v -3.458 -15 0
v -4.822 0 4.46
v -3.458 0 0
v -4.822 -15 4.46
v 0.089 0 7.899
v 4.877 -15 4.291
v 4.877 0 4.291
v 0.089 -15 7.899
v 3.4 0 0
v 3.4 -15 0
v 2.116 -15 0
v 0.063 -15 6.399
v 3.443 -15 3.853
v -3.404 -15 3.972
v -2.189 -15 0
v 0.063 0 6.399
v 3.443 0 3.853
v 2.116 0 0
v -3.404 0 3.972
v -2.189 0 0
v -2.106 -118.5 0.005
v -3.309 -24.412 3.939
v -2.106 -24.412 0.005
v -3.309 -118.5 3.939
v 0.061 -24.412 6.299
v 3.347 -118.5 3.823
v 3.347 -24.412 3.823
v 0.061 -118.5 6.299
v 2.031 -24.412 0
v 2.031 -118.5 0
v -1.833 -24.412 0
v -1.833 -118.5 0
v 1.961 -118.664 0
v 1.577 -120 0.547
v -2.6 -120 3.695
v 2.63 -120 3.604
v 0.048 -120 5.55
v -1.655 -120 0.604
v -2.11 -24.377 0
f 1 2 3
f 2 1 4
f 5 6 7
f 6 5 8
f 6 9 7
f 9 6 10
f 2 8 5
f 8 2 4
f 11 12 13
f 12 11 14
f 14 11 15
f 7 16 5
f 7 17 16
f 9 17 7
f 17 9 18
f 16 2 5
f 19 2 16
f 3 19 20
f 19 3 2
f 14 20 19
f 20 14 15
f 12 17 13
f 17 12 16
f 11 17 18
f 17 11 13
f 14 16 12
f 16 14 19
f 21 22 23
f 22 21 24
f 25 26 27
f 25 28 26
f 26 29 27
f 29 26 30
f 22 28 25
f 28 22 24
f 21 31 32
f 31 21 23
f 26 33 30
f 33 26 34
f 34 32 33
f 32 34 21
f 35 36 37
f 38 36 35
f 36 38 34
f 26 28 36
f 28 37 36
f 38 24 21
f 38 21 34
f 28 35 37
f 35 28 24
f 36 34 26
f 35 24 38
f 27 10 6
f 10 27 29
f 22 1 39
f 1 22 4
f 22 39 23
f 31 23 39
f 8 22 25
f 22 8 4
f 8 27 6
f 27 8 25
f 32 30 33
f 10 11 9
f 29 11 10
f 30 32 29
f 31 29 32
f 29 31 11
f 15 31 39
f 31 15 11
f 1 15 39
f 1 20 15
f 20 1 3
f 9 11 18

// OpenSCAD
fn=5;
d=7;
height=120;

con_thickness=1.5;
con_height=15;
con_tol=0.2;
con_fall=30;

top_helper=1.5;

ez2print();


module ez2print(){
  difference(){
    translate([0,0,d*0.4])
    rotate([90,55,0])
    all();

    translate([-height/2,-height,-height])
    cube([height,height,height]);
  }
}

module all(){
  stick();
  top_helper();
  connector_outer();
  connector_fall();
}

module stick(){
  translate([0,0,con_height])
  cylinder(d=d,h=height-con_height-top_helper,$fn=fn);
}

module top_helper(){
  translate([0,0,height-top_helper])
  cylinder(d1=d,d2=d-top_helper,h=top_helper,$fn=fn);
}

module connector_outer(){
  difference(){
    cylinder(d=d+con_tol+con_thickness*2,h=con_height,$fn=fn);
    cylinder(d=d+con_tol,h=con_height,$fn=fn);
  }
}

module connector_fall(){
  translate([0,0,con_height])
  cylinder(d1=d+con_tol+con_thickness*2,d2=0,h=con_fall,$fn=fn);
}
